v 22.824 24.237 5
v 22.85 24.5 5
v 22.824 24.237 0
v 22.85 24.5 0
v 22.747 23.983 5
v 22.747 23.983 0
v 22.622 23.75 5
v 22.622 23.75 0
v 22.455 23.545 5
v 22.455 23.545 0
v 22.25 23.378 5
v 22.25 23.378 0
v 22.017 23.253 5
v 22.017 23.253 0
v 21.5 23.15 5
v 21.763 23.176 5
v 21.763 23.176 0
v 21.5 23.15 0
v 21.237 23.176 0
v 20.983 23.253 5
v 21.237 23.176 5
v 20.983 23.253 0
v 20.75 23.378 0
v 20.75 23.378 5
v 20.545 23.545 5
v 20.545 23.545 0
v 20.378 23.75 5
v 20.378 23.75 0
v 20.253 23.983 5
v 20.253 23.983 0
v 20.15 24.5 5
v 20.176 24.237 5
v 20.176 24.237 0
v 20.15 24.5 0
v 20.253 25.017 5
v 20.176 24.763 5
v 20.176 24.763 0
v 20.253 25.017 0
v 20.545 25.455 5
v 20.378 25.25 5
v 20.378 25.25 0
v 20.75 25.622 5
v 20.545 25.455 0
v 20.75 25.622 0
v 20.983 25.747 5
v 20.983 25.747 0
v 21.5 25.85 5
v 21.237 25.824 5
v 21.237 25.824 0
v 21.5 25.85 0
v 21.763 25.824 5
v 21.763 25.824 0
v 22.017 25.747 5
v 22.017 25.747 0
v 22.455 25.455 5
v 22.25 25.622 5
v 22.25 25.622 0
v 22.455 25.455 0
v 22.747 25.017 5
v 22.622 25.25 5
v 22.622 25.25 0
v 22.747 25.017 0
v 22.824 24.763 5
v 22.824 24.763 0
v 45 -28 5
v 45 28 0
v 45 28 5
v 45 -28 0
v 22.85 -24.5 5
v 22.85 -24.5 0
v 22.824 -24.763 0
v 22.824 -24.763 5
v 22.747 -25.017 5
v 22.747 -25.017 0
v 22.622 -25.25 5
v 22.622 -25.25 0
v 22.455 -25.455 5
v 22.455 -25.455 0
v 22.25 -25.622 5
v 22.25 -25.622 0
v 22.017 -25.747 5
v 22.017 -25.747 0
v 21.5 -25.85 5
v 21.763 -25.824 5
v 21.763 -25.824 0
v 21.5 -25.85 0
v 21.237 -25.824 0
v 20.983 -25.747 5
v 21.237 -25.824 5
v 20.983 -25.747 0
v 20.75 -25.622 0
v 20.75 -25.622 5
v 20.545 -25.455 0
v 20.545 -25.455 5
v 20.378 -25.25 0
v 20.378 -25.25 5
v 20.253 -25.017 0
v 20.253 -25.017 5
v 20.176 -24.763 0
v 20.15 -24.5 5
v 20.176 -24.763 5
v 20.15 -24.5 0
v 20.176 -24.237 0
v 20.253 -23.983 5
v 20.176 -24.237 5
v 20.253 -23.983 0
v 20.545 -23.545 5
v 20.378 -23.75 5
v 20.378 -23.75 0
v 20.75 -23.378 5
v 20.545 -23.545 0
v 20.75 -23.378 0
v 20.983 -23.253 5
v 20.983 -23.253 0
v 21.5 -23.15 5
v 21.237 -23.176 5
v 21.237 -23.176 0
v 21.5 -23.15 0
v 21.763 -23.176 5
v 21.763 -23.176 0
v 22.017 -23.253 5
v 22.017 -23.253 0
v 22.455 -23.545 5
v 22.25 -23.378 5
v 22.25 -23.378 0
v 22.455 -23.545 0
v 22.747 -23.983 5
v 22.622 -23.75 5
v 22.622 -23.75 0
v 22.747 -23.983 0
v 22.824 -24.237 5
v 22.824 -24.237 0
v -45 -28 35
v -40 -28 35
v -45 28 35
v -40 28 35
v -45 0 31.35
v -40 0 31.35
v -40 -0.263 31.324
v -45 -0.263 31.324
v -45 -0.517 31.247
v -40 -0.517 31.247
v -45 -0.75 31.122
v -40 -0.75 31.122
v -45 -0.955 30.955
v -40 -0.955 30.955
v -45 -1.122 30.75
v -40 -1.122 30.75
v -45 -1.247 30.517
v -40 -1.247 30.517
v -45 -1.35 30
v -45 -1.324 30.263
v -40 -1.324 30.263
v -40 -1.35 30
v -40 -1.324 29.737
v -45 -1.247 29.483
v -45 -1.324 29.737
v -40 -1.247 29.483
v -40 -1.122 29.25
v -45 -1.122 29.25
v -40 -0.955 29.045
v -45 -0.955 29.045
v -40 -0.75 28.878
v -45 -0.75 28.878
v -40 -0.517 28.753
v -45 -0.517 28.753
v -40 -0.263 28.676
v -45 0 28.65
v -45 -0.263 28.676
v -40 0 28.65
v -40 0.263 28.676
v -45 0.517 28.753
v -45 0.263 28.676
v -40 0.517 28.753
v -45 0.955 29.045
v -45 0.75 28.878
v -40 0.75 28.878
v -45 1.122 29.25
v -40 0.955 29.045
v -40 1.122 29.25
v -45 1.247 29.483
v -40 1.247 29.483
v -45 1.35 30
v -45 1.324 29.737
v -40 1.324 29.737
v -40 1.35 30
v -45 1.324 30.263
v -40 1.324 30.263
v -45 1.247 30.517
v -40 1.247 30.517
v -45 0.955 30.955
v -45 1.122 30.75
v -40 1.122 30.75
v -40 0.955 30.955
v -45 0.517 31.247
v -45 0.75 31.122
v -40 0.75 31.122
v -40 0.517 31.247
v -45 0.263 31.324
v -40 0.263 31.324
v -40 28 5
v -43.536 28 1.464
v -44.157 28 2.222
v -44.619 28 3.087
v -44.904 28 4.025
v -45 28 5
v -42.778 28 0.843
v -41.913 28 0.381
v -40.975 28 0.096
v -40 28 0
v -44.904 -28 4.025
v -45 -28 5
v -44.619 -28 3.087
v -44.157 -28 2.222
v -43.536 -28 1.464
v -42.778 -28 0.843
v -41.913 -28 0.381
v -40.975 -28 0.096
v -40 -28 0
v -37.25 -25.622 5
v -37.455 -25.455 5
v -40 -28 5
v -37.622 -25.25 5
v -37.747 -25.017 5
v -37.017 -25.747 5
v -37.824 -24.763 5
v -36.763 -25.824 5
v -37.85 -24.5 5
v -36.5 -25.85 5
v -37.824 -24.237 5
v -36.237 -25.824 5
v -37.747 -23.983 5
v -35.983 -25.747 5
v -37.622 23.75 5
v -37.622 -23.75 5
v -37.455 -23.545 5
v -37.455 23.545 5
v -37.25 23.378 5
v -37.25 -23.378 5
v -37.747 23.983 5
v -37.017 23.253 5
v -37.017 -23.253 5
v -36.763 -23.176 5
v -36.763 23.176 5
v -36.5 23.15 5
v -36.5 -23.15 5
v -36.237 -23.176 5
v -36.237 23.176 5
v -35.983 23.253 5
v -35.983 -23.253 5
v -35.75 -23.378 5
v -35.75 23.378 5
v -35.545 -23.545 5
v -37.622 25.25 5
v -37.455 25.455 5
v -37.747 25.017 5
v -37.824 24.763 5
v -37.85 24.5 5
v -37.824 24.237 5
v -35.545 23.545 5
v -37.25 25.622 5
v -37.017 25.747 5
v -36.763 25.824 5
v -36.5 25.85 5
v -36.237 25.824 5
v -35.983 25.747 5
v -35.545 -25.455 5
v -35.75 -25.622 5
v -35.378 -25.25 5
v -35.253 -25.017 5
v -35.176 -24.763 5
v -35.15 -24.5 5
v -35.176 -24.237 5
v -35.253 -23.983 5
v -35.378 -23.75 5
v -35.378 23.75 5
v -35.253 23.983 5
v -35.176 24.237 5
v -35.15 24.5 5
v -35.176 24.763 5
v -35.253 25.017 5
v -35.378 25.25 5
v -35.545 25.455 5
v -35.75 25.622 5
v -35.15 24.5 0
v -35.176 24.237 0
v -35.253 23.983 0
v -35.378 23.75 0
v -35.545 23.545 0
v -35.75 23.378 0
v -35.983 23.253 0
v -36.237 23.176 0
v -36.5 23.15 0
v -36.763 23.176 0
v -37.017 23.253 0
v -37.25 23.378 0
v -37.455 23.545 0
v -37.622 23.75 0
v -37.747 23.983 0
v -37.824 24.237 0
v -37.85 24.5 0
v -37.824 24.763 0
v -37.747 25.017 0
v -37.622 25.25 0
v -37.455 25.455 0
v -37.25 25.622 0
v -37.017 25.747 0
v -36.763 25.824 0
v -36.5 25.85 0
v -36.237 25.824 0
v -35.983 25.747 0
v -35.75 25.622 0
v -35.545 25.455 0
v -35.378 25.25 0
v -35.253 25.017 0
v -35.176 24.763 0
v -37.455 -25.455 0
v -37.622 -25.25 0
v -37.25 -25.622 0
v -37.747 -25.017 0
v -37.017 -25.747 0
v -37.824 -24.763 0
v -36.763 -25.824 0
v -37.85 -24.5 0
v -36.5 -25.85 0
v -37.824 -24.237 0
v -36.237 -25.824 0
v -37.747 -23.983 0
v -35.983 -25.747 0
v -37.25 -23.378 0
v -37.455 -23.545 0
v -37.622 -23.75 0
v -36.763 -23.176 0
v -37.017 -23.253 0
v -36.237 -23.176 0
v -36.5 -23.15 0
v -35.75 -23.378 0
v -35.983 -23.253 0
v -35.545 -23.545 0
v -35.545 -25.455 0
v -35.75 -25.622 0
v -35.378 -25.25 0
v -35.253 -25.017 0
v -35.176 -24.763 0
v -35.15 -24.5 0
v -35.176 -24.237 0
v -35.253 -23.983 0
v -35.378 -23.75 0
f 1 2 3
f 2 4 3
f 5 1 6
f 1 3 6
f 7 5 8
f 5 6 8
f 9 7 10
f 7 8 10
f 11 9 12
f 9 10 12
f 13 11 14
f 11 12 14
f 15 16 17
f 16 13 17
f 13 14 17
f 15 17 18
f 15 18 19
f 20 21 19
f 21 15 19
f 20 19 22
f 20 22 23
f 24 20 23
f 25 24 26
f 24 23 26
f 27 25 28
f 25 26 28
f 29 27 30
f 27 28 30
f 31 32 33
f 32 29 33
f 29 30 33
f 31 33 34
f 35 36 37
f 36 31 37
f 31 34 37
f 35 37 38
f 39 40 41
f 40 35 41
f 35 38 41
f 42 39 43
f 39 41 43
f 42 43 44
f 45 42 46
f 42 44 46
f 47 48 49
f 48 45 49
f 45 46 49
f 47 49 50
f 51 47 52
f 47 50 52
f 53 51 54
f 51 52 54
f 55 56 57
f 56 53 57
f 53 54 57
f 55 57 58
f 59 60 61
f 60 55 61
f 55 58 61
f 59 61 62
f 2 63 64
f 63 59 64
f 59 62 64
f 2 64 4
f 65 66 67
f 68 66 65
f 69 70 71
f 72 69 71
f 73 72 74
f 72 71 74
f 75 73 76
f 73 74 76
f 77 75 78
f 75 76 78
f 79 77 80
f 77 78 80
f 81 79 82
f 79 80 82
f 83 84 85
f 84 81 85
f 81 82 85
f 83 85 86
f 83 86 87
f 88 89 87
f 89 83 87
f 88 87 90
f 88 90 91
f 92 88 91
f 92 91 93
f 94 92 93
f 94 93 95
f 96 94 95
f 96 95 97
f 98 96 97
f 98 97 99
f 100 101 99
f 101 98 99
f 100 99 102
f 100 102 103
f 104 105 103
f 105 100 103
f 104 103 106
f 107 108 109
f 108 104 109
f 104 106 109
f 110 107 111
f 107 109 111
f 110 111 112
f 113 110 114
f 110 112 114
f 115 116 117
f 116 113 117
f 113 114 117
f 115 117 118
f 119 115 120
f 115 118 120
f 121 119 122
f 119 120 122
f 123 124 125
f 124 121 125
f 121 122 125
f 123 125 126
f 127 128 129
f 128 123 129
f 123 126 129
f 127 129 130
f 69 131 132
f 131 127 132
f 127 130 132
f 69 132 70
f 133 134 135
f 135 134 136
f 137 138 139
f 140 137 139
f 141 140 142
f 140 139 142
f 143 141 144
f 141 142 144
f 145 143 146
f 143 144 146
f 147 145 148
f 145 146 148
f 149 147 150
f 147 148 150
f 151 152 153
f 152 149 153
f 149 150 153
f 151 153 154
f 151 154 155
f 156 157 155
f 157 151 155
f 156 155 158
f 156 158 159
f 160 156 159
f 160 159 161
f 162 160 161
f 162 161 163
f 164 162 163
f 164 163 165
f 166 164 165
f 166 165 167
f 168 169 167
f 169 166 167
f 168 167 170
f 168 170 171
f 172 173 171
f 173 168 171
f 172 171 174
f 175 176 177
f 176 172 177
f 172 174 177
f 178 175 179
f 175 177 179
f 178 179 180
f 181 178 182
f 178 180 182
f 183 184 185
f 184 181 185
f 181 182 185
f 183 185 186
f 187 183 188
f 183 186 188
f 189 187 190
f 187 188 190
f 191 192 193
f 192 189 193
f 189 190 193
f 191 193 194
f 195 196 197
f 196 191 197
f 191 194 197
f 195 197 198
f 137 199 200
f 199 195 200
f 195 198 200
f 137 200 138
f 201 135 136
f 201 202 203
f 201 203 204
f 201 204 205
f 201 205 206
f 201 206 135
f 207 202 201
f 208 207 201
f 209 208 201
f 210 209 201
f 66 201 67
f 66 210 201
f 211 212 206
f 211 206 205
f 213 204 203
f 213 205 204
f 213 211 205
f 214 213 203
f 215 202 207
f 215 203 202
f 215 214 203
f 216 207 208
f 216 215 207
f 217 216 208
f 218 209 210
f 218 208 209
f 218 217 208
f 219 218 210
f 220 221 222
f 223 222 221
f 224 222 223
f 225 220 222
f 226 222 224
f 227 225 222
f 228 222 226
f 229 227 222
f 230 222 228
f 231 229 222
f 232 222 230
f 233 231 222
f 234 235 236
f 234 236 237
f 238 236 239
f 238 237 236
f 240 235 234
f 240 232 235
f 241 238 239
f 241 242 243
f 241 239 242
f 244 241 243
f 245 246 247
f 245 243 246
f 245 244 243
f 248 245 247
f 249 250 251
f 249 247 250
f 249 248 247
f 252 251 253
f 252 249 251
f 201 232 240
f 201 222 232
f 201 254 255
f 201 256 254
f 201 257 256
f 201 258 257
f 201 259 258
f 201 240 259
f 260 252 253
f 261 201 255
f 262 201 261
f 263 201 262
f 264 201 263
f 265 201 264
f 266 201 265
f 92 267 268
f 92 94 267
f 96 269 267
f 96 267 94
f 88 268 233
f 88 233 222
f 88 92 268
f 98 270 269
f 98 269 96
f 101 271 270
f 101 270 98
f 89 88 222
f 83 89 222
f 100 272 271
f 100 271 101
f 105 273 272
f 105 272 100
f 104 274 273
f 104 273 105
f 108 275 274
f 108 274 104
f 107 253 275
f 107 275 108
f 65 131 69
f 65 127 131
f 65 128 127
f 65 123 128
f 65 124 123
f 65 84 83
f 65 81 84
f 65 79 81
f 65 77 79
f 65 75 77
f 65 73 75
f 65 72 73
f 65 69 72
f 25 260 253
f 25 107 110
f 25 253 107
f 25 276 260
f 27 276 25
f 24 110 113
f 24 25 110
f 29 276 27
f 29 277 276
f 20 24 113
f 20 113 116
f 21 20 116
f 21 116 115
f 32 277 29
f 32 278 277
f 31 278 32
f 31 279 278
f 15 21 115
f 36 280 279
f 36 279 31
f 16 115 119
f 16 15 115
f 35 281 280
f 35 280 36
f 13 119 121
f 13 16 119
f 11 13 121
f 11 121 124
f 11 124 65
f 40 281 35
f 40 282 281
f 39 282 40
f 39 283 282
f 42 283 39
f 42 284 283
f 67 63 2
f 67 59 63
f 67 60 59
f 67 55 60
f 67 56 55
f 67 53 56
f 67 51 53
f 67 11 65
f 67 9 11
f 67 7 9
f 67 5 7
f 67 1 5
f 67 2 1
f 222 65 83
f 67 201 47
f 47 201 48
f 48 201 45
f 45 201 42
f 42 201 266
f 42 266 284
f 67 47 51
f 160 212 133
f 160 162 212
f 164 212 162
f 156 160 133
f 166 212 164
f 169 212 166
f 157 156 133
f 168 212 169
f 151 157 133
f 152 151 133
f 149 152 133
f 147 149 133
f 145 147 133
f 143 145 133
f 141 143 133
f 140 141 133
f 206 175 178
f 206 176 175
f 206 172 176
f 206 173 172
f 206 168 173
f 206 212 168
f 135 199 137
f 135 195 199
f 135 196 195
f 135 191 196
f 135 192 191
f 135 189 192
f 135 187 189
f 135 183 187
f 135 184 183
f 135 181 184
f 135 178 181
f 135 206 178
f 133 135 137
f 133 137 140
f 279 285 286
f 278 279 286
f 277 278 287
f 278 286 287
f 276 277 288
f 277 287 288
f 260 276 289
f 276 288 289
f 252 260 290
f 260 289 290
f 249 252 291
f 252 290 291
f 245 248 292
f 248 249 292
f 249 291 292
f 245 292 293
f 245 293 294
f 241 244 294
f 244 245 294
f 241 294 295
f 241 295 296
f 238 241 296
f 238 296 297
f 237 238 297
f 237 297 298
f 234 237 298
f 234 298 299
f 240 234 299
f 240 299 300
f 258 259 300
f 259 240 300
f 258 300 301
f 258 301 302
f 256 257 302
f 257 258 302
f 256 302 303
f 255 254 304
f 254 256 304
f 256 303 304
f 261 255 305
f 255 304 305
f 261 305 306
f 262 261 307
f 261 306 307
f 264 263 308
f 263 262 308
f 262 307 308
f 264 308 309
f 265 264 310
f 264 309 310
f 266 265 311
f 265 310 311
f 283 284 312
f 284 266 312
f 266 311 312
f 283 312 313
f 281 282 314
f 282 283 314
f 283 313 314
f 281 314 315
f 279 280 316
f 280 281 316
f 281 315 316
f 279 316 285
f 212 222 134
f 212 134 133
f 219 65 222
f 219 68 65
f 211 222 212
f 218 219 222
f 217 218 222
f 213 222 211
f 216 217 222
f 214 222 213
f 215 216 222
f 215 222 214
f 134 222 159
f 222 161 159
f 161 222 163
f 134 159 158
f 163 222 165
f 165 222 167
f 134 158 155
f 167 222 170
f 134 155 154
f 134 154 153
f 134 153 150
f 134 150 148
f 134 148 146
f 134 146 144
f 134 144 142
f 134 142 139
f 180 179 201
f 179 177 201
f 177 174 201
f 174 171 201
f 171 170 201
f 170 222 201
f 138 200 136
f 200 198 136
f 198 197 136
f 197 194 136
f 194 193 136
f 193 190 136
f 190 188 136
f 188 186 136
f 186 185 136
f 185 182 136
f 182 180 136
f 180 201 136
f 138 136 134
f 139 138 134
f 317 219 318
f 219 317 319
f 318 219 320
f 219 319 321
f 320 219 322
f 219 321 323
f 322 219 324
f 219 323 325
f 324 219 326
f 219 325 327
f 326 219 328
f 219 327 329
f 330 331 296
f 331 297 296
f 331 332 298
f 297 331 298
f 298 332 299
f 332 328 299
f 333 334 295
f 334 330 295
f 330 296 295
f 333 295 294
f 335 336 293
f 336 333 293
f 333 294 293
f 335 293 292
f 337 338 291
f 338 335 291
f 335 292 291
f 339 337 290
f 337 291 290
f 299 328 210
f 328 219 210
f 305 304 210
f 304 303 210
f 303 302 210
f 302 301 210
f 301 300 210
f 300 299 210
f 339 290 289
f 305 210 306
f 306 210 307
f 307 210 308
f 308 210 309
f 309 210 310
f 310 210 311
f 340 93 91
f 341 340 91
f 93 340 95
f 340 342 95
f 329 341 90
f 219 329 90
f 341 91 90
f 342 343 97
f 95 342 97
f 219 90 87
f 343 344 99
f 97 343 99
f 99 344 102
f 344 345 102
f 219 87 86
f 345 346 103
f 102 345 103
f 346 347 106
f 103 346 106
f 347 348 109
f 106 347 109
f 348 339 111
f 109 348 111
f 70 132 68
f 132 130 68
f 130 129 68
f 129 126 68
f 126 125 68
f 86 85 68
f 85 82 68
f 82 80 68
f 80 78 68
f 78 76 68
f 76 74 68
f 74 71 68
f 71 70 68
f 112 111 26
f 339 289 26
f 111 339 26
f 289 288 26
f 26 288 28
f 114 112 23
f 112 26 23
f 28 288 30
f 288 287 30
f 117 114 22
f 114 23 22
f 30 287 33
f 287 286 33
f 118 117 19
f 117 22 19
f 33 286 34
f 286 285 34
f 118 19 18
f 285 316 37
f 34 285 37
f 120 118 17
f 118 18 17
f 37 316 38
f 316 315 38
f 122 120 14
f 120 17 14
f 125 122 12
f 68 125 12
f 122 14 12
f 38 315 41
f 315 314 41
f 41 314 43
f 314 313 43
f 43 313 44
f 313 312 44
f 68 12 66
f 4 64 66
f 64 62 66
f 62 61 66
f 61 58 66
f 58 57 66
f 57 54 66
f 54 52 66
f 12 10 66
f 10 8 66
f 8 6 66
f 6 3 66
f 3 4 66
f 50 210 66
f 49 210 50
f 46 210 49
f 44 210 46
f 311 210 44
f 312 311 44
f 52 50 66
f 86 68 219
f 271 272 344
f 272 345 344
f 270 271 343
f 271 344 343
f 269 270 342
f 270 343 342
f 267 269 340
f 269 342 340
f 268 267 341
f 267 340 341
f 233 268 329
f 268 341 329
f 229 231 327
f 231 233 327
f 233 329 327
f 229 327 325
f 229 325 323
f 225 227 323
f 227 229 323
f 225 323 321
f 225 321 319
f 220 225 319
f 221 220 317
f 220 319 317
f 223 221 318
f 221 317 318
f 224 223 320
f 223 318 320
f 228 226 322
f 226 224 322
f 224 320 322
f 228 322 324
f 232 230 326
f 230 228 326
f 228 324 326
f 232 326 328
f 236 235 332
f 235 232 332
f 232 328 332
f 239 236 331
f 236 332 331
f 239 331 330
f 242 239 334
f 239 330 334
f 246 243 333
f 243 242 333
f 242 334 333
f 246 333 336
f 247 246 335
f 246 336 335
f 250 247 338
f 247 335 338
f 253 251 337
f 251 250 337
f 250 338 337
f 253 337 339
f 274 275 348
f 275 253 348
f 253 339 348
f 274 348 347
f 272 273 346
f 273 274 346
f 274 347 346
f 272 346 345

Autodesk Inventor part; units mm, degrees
ref_plane "YZ Plane" through (0, 0, 0) normal (1, 0, 0) x (0, 1, 0)
ref_plane "XZ Plane" through (0, 0, 0) normal (0, 1, 0) x (-1, 0, 0)
ref_plane "XY Plane" through (0, 0, 0) normal (0, 0, 1) x (1, 0, 0)
sketch "Sketch1" plane through (0, 0, 0) normal (0, 0, 1) x (1, 0, 0)
  line L0 (-45, 28) -> (45, 28)
  line L1 (45, 28) -> (45, -28)
  line L2 (45, -28) -> (-45, -28)
  line L3 (-45, -28) -> (-45, 28)
  line L4 (-45, 28) -> (45, -28) construction
  line L5 (45, 28) -> (-45, -28) construction
  line L6 (-40, -28) -> (-40, 28)
  circle A0 centre (-36.5, 24.5) radius 1.35
  line L7 (-10.2595, 0) -> (11.3926, 0)
  line L8 (-36.5, 24.5) -> (-7.5, 24.5)
  line L9 (-7.5, 24.5) -> (-7.5, 0)
  circle A1 centre (21.5, 24.5) radius 1.35
  circle A2 centre (-36.5, -24.5) radius 1.35
  circle A3 centre (21.5, -24.5) radius 1.35
  point P0 (0, 0)
  dimension "d0" = 90
  dimension "d1" = 56
  dimension "d4" = 5
  dimension "d5" = 2.7
  dimension "d6" = 3.5
  dimension "d7" = 3.5
  dimension "d8" = 29
  dimension "d9" = 49
extrude "Extrusion1" add sketch "Sketch1" along normal blind 5 contours L0 L1 L2 L6
sketch "Sketch4" plane through (-40, -28, 0) normal (-1, 0, 0) x (0, 0, 1)
  line L0 (0, 0) -> (5, 0) projected
  line L1 (0, 0) -> (35, 0)
  line L2 (35, 0) -> (35, 56)
  line L3 (35, 56) -> (0, 56)
  line L4 (0, 56) -> (0, 0)
  circle A0 centre (30, 28) radius 1.35
  point P0 (0, 28)
  dimension "d19" = 35
  dimension "d20" = 2.7
  dimension "d21" = 5
  dimension "d22" = 28
  dimension "d25" = 56
extrude "Extrusion3" add sketch "Sketch4" along normal blind 5
fillet "Fillet1" radius 5 1 edges at (-45, 0, 0)
properties part number "Pi4Bracket"
